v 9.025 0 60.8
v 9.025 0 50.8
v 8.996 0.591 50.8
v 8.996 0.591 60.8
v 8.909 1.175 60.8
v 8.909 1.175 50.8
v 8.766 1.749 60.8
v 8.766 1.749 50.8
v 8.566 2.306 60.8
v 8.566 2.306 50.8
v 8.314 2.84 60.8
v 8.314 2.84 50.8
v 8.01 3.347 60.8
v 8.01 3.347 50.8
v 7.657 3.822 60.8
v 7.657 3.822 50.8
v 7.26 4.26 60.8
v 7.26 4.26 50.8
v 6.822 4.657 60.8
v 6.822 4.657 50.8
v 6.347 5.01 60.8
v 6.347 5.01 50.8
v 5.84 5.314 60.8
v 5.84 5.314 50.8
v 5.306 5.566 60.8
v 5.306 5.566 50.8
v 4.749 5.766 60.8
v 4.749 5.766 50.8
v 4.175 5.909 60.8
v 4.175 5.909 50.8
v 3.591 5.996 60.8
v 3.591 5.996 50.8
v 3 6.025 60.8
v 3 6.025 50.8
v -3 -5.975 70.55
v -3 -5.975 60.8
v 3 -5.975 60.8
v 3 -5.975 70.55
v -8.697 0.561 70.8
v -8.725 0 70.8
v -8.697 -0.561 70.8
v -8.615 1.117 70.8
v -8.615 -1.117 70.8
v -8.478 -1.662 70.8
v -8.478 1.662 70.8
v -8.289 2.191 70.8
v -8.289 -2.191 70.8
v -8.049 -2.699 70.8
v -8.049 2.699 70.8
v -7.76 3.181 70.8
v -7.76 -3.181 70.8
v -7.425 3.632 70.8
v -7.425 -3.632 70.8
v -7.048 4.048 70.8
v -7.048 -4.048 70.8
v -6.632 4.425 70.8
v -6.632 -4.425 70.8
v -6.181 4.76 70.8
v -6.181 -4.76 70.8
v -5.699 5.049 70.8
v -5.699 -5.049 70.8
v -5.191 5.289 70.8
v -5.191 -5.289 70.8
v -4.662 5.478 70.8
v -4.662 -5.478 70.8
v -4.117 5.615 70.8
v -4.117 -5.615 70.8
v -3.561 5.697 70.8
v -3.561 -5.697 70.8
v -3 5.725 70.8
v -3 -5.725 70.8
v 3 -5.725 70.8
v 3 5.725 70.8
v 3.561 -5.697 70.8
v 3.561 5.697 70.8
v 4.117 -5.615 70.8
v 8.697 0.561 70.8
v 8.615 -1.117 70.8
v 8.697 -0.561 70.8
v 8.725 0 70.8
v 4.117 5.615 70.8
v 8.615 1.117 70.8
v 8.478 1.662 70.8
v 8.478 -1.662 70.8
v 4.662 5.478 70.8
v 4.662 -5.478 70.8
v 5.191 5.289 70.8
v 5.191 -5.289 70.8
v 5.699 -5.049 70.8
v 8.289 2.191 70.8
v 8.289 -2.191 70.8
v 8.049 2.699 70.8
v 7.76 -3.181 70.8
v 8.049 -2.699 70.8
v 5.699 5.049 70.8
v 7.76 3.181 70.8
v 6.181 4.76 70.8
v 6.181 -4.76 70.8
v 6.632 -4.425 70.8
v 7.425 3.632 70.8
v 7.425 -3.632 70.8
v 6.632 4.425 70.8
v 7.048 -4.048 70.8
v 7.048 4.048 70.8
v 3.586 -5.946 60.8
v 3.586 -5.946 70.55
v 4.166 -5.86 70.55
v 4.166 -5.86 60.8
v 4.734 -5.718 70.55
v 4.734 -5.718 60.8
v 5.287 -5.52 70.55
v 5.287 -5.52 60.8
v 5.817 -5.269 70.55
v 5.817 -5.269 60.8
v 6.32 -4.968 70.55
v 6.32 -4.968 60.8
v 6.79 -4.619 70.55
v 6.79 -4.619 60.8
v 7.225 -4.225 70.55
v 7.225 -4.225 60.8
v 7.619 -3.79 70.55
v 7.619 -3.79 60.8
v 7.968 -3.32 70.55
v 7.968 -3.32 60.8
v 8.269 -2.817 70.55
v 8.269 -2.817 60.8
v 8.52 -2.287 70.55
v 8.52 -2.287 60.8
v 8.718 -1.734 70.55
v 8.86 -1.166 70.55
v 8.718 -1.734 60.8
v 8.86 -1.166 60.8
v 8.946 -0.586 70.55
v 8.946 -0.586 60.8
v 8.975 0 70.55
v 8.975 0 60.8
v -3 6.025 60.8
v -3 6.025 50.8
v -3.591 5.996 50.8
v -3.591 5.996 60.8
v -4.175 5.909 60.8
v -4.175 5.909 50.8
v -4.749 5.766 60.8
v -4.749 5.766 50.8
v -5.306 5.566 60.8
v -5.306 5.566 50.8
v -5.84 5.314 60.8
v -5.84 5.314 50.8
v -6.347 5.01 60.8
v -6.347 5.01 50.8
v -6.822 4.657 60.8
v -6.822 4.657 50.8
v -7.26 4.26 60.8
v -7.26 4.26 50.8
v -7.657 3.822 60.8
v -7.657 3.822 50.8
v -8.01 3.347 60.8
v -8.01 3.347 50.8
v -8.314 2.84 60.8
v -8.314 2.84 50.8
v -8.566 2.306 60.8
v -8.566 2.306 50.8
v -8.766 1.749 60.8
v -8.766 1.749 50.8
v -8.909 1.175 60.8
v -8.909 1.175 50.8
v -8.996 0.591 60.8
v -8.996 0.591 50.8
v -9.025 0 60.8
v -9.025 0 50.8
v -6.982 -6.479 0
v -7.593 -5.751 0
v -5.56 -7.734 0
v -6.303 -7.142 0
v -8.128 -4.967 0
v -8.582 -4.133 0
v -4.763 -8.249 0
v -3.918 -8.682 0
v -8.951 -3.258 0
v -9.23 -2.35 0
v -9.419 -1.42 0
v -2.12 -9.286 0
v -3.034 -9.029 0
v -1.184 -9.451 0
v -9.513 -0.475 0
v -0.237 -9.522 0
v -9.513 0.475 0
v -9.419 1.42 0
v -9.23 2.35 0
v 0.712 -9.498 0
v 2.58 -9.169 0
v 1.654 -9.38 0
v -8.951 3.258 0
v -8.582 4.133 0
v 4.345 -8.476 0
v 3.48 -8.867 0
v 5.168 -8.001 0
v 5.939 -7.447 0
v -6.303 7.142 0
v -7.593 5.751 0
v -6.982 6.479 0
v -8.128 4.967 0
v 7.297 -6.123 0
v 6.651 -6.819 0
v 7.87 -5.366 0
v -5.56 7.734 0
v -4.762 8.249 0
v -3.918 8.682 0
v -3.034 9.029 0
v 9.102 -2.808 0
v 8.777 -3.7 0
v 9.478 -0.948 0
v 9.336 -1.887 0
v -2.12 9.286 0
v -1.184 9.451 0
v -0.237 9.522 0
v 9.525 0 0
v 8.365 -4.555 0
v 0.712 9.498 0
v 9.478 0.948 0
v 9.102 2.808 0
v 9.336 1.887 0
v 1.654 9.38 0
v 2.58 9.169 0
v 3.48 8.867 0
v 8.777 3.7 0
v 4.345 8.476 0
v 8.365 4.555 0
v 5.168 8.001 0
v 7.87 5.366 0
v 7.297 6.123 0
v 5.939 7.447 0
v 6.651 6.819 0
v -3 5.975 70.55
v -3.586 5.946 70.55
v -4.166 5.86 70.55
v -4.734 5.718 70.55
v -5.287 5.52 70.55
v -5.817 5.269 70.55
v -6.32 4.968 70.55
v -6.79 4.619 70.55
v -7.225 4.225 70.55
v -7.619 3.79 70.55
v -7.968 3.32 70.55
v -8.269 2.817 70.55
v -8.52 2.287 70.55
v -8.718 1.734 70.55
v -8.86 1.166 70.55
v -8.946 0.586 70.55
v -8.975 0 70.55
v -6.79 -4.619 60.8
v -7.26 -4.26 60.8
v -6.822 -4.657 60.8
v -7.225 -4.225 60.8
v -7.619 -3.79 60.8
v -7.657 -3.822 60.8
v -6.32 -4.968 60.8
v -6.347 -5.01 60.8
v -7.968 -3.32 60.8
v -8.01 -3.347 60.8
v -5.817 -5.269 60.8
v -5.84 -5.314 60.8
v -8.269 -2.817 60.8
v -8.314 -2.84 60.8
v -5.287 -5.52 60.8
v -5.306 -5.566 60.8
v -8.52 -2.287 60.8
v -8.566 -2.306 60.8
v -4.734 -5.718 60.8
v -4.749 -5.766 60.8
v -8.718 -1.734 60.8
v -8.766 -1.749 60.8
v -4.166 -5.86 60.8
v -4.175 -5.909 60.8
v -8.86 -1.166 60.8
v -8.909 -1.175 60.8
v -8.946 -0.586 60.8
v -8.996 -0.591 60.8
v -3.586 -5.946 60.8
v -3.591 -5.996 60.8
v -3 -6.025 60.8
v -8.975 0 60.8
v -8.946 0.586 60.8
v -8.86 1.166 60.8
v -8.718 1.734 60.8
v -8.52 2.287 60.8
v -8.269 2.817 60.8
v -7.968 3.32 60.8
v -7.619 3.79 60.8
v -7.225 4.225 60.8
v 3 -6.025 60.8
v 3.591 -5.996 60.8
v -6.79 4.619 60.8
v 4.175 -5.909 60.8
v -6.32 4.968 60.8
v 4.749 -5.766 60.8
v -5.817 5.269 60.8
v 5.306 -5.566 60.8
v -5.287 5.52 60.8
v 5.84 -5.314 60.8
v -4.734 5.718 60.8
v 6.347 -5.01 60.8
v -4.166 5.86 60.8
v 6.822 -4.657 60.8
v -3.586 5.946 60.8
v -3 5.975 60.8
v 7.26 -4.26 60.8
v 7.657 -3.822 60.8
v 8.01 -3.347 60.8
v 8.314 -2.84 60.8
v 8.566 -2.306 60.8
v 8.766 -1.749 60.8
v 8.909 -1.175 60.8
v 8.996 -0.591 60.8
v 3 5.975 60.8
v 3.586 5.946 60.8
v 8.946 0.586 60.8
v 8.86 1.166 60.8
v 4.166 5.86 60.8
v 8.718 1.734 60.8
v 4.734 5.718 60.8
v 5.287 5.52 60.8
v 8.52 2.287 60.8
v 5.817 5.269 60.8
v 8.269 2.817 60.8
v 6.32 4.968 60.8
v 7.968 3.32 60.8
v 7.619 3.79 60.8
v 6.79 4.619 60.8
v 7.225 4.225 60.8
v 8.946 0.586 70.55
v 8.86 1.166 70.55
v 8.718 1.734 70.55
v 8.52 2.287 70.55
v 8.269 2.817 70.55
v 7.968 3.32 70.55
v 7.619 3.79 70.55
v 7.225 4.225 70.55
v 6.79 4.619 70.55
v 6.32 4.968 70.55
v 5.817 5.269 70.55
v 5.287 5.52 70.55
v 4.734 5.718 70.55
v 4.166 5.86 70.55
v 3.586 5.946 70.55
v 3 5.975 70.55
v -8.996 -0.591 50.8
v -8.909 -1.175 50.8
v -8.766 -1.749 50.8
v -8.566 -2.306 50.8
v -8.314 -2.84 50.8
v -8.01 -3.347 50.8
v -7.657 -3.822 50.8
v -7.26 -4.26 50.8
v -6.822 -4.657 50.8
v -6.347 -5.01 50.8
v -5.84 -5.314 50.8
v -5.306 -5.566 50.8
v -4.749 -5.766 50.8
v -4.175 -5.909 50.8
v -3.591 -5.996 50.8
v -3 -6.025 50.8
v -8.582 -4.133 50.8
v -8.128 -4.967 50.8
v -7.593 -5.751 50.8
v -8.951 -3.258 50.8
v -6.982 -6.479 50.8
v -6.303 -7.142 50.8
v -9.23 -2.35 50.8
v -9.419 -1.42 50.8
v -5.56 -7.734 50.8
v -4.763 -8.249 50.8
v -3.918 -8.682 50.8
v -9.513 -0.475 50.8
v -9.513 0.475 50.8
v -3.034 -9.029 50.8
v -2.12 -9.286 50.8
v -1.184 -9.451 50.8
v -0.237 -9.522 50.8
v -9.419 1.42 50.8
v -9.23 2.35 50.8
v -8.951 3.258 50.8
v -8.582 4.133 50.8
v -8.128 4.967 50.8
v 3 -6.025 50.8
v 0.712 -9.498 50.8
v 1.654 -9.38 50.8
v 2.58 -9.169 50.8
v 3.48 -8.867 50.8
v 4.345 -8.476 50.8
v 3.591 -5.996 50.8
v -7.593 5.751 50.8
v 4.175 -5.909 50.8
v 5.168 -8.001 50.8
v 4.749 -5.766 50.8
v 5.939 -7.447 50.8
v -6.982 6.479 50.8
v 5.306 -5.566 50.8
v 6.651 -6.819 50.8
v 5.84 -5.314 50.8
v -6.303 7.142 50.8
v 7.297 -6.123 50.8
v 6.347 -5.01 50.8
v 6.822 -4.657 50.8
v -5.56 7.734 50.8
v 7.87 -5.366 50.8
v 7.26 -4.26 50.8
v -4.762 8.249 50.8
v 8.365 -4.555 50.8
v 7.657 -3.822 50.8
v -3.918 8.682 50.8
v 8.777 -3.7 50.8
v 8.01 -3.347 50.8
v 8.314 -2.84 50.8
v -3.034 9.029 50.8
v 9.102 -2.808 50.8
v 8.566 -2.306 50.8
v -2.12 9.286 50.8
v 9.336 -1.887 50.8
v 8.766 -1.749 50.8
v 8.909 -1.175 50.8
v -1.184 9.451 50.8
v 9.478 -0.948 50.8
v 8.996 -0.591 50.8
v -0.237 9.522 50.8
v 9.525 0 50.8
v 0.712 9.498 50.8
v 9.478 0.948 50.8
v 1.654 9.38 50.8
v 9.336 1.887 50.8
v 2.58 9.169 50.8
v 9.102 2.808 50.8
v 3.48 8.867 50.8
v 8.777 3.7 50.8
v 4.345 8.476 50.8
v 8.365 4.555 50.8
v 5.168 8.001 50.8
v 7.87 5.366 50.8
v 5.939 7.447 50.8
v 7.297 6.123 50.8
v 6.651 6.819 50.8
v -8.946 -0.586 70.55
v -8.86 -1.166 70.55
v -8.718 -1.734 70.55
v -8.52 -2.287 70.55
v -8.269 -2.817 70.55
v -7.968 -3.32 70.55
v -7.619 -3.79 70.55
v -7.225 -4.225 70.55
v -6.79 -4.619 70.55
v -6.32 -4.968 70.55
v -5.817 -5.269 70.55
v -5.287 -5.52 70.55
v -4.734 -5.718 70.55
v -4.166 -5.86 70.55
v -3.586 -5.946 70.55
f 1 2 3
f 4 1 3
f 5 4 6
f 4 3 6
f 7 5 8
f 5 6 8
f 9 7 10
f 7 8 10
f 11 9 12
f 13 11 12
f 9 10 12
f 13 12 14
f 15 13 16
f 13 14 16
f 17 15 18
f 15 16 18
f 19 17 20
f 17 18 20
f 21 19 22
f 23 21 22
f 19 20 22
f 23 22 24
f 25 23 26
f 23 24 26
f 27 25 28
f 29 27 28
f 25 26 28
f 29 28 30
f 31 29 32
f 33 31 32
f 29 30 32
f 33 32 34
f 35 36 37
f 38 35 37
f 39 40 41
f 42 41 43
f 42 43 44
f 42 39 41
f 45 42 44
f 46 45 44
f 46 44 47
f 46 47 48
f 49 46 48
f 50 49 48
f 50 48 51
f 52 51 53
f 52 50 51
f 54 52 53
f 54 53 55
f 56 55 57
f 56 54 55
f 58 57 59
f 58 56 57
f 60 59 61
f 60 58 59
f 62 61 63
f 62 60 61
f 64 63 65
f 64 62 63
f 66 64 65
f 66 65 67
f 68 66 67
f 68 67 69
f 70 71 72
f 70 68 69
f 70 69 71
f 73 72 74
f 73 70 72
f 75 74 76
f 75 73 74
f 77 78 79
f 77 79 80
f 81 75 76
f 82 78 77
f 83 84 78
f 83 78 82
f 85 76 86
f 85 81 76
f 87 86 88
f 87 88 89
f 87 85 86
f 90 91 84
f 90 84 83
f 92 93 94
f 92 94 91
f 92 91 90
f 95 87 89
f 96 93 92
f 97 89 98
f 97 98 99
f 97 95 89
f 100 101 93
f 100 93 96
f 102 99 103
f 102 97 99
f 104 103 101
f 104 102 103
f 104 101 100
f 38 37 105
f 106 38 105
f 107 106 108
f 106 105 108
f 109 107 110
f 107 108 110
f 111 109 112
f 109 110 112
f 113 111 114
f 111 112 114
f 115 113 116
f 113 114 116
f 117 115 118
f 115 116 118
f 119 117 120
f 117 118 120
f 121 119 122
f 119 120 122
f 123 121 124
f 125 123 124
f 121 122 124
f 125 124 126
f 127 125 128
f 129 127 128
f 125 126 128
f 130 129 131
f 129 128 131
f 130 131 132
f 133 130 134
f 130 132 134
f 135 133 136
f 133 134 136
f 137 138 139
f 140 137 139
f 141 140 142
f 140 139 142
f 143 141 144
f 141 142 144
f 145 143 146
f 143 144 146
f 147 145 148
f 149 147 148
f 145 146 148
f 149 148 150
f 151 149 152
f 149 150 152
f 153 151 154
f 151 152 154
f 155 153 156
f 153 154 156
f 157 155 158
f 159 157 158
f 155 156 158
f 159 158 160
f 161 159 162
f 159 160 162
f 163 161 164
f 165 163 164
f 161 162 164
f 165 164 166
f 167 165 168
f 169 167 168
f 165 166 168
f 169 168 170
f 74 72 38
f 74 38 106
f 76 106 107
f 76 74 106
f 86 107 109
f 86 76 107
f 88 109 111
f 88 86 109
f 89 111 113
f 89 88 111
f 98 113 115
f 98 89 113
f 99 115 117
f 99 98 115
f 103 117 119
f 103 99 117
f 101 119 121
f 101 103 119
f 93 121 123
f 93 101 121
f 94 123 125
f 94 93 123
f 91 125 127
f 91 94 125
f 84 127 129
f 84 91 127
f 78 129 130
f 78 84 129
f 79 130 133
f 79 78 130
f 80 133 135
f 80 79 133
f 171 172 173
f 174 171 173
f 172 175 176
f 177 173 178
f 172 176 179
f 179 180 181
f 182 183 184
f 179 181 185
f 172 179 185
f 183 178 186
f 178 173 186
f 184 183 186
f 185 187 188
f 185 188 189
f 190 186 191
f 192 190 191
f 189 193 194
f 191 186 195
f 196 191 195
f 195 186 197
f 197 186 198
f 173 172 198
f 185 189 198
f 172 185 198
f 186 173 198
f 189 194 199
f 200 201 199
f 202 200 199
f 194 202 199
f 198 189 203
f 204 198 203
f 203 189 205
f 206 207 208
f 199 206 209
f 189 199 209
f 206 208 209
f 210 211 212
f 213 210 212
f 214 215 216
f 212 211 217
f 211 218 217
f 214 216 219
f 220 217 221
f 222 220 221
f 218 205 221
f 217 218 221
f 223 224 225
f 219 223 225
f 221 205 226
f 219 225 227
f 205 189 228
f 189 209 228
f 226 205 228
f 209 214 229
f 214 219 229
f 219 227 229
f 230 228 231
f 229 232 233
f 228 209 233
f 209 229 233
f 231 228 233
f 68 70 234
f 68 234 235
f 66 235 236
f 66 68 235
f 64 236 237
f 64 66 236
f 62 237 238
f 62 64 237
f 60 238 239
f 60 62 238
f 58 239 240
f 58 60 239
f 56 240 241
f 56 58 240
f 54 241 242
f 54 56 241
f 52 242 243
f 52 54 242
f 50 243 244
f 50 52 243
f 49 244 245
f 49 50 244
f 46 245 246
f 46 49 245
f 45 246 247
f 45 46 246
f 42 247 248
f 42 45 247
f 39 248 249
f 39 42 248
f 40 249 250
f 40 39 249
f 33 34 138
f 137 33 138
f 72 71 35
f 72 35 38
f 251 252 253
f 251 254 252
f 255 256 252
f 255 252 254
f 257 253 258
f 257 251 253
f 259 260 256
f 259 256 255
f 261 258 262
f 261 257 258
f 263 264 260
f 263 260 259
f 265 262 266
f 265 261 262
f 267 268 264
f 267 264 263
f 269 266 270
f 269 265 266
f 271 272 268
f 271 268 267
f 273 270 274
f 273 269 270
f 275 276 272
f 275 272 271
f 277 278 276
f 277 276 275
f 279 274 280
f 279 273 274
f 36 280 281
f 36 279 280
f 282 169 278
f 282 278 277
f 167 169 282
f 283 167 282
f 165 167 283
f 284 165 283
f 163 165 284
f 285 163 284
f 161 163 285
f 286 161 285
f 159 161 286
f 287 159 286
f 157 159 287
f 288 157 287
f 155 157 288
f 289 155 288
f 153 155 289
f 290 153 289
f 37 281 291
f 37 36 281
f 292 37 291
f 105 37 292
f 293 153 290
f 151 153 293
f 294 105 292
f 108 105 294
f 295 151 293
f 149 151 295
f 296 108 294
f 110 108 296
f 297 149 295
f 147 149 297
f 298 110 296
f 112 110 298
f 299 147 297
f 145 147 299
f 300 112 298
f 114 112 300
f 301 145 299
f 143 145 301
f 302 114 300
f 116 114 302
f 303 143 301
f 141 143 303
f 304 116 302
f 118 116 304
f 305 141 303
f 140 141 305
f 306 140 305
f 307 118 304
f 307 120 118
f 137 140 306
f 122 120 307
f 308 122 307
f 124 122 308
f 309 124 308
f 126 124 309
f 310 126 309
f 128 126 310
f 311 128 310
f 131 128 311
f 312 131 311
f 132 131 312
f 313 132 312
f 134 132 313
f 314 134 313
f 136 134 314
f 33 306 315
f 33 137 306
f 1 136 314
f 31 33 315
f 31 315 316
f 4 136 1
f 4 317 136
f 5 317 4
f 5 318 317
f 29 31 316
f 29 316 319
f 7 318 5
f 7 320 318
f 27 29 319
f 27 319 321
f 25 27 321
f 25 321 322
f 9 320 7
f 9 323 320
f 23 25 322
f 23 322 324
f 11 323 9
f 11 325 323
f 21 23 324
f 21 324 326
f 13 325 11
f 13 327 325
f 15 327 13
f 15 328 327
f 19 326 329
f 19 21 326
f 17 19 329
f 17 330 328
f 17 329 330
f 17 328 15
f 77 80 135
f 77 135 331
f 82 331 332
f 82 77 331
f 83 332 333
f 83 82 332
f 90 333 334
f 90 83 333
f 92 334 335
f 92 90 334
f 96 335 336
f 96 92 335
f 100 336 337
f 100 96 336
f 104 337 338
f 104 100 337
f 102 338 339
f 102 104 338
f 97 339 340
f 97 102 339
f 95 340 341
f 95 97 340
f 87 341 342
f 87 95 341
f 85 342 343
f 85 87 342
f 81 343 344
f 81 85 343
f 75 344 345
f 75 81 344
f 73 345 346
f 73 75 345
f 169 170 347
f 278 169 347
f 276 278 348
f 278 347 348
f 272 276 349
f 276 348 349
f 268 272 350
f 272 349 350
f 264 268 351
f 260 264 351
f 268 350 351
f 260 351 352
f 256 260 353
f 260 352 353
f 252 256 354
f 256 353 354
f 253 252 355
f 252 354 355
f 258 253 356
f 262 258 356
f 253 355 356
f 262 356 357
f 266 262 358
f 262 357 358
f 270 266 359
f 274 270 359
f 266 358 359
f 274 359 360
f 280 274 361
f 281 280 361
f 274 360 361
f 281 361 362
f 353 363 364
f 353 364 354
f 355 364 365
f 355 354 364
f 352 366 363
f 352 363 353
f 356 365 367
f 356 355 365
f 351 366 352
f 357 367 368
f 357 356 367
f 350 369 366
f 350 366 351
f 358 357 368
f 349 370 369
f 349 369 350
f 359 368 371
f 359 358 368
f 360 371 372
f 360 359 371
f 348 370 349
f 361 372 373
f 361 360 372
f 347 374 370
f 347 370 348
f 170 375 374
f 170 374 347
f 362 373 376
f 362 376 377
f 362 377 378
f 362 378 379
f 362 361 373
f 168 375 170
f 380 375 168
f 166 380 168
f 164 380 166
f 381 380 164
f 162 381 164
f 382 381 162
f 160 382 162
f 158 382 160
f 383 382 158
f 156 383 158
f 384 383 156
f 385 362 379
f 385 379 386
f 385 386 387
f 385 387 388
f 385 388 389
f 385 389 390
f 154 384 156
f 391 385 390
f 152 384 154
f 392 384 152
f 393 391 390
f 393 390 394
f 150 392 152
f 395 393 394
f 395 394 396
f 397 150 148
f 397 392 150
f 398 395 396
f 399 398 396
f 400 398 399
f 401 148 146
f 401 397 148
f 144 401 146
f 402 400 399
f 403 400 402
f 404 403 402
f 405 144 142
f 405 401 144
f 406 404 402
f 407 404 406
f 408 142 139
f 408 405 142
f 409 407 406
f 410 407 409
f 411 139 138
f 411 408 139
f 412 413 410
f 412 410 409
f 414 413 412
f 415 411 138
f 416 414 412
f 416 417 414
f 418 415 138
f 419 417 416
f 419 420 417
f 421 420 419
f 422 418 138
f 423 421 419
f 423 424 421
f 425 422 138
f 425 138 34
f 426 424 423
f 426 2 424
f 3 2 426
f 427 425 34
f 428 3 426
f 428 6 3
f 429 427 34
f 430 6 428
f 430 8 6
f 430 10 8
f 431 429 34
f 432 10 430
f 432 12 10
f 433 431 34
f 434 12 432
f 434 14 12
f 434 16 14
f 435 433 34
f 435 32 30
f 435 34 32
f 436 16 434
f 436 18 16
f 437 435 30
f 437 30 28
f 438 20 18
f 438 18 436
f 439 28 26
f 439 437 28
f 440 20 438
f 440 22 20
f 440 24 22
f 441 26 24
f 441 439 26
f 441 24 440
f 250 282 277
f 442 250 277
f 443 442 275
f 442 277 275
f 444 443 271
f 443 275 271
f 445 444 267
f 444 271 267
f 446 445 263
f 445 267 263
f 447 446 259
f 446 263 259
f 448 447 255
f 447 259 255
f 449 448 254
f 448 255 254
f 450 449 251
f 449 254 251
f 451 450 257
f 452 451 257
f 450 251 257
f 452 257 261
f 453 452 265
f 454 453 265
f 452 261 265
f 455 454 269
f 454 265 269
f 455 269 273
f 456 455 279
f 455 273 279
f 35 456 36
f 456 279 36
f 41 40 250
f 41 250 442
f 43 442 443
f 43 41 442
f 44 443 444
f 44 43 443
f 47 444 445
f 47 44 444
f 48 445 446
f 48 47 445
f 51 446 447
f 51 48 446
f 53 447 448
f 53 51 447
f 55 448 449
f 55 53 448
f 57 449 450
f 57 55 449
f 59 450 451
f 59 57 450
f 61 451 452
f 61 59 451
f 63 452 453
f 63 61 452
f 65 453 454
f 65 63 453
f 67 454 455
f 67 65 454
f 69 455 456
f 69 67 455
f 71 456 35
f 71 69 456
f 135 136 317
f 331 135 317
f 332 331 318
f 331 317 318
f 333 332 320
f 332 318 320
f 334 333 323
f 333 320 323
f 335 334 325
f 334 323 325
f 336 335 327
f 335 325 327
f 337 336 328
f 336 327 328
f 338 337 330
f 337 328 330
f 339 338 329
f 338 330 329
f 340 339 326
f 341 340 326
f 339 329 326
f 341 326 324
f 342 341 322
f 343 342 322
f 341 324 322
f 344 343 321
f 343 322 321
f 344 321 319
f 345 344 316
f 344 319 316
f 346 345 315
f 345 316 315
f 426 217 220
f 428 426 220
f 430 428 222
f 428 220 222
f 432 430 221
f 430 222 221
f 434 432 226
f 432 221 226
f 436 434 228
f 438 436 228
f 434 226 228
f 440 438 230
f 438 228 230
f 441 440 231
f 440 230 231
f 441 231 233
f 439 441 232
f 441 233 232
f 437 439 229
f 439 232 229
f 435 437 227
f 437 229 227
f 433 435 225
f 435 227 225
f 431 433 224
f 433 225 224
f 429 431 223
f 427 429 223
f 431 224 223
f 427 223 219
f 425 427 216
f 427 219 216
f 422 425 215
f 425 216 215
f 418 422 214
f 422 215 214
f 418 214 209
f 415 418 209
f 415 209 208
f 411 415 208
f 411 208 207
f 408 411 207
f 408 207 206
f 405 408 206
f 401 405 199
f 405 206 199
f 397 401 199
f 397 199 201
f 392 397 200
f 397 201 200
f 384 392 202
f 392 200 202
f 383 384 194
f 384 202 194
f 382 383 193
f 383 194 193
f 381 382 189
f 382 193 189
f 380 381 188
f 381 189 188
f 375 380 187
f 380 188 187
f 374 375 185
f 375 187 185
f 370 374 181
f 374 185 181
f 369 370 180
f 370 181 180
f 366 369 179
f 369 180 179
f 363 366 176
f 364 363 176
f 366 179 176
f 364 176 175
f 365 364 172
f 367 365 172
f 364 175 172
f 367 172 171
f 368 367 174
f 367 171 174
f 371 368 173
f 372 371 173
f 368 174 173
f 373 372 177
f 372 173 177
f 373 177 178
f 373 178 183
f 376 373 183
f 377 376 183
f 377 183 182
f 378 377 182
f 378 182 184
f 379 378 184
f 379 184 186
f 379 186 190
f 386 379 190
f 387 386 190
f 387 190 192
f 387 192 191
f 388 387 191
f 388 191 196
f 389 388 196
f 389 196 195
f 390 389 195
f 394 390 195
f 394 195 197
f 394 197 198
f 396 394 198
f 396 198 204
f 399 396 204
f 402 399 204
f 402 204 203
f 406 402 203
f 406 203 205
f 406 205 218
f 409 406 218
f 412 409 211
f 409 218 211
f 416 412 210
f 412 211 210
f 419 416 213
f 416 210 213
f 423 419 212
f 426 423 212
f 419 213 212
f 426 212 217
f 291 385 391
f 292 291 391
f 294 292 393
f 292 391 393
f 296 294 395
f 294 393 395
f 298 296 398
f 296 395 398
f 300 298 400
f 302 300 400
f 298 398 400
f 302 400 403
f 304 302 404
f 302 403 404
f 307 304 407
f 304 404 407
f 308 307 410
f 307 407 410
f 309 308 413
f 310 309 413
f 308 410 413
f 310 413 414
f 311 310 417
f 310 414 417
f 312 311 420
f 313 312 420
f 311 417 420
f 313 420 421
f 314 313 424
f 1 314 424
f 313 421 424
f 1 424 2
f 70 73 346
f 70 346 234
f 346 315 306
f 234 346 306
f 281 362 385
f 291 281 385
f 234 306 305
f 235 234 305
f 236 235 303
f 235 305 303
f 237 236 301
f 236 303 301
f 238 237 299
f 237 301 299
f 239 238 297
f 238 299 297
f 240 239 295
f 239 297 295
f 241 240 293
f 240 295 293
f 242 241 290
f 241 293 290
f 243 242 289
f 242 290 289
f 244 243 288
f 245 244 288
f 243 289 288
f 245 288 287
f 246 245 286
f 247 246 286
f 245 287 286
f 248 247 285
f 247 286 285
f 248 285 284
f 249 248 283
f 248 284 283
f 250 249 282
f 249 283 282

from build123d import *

# Parameters (mm, degrees)
F0_R     = 9.525
F1_DEPTH = 50.8
F3_DEPTH = 10
F5_DEPTH = 10
F6_SIZE  = 0.25


with BuildPart() as f1:
    # F0 (on Top) → F1 (new body)
    with BuildSketch(Plane.XY):
        Circle(F0_R)
    extrude(amount=F1_DEPTH)

    # F2 (on face) → F3 (join)
    with BuildSketch(Plane.XY.offset(50.8)):
        with BuildLine():
            Line((0, 6.025), (0, 0))
            Line((0, 0), (3, 0))
            Line((3, 0), (9.025, 0))
            ThreePointArc((9.025, 0), (7.260318, 4.260318), (3, 6.025))
            Line((3, 6.025), (0, 6.025))
        make_face()
        with BuildLine():
            Line((0, -6.025), (0, 0))
            Line((0, 0), (-3, 0))
            Line((-3, 0), (-9.025, 0))
            ThreePointArc((-9.025, 0), (-7.260318, -4.260318), (-3, -6.025))
            Line((-3, -6.025), (0, -6.025))
        make_face()
        with BuildLine():
            Line((-3, 0), (0, 0))
            Line((0, 0), (0, 6.025))
            Line((0, 6.025), (-3, 6.025))
            ThreePointArc((-3, 6.025), (-7.260318, 4.260318), (-9.025, 0))
            Line((-9.025, 0), (-3, 0))
        make_face()
        with BuildLine():
            Line((3, 0), (0, 0))
            Line((0, 0), (0, -6.025))
            Line((0, -6.025), (3, -6.025))
            ThreePointArc((3, -6.025), (7.260318, -4.260318), (9.025, 0))
            Line((9.025, 0), (3, 0))
        make_face()
    extrude(amount=F3_DEPTH)

    # F4 (on face) → F5 (join)
    with BuildSketch(Plane.XY.offset(60.8)):
        with BuildLine():
            Line((0, 5.975), (0, 0))
            Line((0, 0), (3, 0))
            Line((3, 0), (8.975, 0))
            ThreePointArc((8.975, 0), (7.224963, 4.224963), (3, 5.975))
            Line((3, 5.975), (0, 5.975))
        make_face()
        with BuildLine():
            Line((0, -5.975), (0, 0))
            Line((0, 0), (-3, 0))
            Line((-3, 0), (-8.975, 0))
            ThreePointArc((-8.975, 0), (-7.224963, -4.224963), (-3, -5.975))
            Line((-3, -5.975), (0, -5.975))
        make_face()
        with BuildLine():
            Line((-3, 0), (0, 0))
            Line((0, 0), (0, 5.975))
            Line((0, 5.975), (-3, 5.975))
            ThreePointArc((-3, 5.975), (-7.224963, 4.224963), (-8.975, 0))
            Line((-8.975, 0), (-3, 0))
        make_face()
        with BuildLine():
            Line((3, 0), (0, 0))
            Line((0, 0), (0, -5.975))
            Line((0, -5.975), (3, -5.975))
            ThreePointArc((3, -5.975), (7.224963, -4.224963), (8.975, 0))
            Line((8.975, 0), (3, 0))
        make_face()
    extrude(amount=F5_DEPTH)

    # F6
    f6_edges = [f1.edges().sort_by_distance(p)[0] for p in [
        (0, -5.975, 70.8),
    ]]
    chamfer(f6_edges, length=F6_SIZE)


solid = f1.part
